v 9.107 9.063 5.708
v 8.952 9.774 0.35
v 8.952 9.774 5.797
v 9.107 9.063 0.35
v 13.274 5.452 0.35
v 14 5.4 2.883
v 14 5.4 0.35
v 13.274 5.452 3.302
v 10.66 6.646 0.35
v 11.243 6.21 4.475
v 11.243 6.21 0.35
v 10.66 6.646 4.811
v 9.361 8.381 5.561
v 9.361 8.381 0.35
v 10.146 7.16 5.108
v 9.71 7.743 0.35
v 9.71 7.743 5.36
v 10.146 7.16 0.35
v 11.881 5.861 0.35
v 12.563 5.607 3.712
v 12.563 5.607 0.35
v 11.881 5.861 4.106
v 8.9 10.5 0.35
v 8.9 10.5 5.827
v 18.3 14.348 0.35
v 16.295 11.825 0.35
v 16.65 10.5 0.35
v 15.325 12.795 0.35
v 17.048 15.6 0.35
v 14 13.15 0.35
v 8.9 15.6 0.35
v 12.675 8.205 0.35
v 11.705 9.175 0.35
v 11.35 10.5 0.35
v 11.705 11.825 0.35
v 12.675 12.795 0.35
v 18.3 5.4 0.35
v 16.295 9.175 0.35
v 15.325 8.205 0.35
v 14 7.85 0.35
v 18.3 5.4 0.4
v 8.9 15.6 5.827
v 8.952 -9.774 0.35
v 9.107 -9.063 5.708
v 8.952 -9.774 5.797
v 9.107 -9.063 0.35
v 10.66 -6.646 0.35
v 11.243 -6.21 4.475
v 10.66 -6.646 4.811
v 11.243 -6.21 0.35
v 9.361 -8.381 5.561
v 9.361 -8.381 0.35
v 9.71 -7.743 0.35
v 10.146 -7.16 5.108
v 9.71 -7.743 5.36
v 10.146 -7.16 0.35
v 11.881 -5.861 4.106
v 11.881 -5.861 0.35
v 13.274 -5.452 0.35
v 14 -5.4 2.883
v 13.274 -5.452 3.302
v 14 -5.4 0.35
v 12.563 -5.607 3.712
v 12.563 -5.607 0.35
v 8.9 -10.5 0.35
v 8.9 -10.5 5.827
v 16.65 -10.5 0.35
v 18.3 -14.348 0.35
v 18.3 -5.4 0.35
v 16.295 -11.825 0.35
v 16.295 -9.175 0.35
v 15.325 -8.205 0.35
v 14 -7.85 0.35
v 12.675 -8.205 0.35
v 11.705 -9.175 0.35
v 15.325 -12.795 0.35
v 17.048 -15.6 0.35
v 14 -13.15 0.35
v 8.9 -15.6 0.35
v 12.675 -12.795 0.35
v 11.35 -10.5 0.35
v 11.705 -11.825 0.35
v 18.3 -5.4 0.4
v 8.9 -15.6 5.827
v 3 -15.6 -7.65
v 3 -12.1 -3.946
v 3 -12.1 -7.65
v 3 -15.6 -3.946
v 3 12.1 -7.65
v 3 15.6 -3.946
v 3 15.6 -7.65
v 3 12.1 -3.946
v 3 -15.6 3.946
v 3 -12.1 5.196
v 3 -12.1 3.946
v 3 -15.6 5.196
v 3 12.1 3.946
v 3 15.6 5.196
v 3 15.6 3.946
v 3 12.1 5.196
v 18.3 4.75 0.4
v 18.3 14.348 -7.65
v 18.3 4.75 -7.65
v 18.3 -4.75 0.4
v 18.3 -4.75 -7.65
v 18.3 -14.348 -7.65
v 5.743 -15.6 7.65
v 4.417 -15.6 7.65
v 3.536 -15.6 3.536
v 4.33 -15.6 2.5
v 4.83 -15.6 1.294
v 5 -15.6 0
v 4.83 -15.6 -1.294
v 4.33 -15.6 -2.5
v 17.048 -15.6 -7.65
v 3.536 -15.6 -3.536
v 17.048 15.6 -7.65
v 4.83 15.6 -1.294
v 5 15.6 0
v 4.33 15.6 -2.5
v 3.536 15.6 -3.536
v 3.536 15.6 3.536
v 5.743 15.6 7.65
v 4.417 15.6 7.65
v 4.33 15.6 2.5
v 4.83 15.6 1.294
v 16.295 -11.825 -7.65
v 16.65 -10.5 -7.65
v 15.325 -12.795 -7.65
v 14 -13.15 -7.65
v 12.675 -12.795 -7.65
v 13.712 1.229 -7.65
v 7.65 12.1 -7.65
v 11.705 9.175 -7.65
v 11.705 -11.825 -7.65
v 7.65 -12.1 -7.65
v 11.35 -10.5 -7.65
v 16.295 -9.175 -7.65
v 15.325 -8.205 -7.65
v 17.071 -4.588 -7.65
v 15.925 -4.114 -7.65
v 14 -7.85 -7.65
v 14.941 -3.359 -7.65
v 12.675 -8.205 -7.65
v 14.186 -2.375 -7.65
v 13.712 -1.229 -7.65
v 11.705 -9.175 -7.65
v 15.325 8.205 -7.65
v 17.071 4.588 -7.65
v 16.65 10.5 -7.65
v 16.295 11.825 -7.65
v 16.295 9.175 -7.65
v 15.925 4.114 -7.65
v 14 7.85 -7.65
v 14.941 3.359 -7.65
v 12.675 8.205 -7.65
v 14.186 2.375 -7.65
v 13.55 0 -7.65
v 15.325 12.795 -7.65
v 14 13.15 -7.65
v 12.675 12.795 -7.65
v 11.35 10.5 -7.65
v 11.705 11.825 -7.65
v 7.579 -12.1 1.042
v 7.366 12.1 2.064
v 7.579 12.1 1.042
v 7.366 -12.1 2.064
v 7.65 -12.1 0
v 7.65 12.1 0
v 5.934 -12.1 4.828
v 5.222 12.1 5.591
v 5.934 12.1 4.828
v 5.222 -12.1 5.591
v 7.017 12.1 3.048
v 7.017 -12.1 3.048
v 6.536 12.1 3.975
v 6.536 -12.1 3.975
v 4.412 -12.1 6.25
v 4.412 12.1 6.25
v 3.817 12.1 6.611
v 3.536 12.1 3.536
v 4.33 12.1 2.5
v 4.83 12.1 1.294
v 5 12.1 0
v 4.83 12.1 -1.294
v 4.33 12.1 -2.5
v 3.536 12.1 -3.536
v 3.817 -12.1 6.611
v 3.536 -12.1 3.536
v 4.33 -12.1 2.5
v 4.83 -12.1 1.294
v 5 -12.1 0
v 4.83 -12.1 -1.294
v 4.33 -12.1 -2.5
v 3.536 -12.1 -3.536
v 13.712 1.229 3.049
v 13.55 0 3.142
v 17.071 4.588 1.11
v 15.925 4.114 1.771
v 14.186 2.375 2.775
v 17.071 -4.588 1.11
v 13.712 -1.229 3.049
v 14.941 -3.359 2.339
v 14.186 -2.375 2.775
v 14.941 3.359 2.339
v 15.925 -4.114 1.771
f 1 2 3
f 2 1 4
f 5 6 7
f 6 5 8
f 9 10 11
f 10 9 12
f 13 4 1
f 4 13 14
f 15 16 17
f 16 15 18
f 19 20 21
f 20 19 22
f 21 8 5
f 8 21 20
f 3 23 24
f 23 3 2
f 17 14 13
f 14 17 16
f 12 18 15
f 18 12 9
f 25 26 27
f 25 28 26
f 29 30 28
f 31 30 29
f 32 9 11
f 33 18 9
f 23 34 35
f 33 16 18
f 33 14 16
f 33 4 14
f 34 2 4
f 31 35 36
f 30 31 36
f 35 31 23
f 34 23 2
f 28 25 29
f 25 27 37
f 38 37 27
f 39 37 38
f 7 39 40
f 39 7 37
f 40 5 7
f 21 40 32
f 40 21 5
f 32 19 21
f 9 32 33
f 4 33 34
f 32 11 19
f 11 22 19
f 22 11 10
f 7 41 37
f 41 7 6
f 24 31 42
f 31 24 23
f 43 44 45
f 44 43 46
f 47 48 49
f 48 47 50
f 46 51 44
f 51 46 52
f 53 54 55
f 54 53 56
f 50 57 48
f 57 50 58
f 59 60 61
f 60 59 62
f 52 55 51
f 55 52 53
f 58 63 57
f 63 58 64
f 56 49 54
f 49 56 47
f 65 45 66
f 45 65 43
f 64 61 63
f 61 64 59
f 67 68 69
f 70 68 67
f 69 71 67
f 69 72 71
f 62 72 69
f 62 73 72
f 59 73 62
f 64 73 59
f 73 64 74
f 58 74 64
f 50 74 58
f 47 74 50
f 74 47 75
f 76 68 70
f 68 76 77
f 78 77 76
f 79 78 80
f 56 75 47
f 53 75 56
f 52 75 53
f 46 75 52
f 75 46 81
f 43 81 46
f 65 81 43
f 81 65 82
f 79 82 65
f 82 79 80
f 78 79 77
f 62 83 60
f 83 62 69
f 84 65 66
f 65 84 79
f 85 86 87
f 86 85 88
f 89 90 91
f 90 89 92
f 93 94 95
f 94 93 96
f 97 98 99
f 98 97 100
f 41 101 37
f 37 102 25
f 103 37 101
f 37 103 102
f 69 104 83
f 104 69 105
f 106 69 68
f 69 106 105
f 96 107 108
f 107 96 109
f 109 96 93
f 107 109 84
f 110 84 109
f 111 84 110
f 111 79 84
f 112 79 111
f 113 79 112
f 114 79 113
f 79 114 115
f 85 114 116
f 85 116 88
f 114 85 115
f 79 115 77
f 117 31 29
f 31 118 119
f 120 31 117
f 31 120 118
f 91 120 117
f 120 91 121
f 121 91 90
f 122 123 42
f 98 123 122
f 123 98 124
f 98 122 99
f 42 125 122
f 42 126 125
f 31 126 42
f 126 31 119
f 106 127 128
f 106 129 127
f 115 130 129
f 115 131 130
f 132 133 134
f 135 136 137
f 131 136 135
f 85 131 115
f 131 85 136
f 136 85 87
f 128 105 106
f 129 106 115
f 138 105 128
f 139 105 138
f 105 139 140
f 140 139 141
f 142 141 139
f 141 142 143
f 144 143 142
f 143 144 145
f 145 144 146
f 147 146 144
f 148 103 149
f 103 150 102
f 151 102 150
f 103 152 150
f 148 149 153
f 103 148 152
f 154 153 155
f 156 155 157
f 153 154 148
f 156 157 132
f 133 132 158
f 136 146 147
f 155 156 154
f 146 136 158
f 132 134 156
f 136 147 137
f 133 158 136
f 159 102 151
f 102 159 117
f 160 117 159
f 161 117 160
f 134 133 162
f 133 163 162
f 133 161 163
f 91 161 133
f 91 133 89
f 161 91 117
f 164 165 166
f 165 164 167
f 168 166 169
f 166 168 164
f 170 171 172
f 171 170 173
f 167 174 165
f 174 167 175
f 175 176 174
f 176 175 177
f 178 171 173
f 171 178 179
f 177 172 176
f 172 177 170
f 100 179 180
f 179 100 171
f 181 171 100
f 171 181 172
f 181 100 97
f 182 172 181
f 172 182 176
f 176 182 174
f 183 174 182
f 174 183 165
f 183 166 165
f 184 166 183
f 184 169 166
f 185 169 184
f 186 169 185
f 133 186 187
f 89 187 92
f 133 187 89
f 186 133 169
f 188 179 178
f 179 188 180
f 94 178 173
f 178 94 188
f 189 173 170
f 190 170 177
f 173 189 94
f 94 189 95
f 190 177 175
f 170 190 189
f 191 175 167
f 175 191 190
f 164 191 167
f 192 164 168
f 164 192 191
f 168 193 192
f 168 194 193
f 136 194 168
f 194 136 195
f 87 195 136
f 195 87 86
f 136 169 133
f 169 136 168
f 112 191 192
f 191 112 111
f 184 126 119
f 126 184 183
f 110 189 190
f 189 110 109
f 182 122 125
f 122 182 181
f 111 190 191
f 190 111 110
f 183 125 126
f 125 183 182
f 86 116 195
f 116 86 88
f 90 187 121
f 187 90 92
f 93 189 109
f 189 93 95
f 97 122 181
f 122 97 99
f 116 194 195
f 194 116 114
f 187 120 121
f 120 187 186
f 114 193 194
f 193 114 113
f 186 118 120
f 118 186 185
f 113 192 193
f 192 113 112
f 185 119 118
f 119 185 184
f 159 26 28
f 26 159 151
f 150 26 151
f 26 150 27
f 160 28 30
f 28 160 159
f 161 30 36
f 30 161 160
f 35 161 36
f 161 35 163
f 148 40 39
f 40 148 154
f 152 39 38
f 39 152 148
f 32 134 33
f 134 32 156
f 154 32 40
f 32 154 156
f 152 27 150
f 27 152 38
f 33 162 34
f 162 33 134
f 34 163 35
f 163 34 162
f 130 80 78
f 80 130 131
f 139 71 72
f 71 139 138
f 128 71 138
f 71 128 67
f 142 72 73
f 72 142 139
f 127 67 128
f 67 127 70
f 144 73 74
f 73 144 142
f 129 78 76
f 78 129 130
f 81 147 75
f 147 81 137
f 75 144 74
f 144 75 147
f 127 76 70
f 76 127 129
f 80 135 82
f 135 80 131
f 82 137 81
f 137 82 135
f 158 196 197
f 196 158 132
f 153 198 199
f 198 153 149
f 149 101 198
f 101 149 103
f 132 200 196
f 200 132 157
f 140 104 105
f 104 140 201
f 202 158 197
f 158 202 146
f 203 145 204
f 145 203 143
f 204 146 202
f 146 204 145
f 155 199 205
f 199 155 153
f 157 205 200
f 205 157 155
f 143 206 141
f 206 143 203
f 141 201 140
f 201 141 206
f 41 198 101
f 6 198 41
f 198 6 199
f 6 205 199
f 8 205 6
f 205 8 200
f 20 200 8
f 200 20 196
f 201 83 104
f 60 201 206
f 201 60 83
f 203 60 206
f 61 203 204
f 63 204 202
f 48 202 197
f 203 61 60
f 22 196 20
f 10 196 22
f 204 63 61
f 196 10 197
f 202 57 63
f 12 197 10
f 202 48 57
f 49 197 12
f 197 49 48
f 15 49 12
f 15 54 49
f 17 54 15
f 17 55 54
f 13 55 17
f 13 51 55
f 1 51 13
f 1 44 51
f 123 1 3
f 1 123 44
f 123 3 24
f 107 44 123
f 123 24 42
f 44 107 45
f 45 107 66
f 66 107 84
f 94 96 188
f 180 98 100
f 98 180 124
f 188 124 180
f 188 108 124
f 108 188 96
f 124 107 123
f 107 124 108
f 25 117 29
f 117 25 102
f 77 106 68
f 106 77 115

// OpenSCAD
//////////////////////////////////////////////////////////////////////////////////////////////
// Zero height LM8UU bearing holder
//
// Copyright (C) 2013  Lochner, Juergen
// http://www.thingiverse.com/Ablapo/designs
//
// This program is free software; you can redistribute it and/or
// modify it under the terms of the GNU General Public License
// as published by the Free Software Foundation; either version 2
// of the License, or (at your option) any later version.
//
// This program is distributed in the hope that it will be useful,
// but WITHOUT ANY WARRANTY; without even the implied warranty of
// MERCHANTABILITY or FITNESS FOR A PARTICULAR PURPOSE.  See the
// GNU General Public License for more details.
//
// You should have received a copy of the GNU General Public License
// along with this program; if not, write to the Free Software
// Foundation, Inc., 51 Franklin Street, Fifth Floor, Boston, MA  02110-1301, USA.
/////////////////////////////////////////////////////////////////////////////////////////////////

// bearing's length
b_length=24.2 ;		
// bearing's diameter
b_dia= 15.3;		

// x distance of holes
dx=28;			
// y distance of holes	
dy=21;				

angle=60;			// holder cut off angle
b_angle=30;		// bearing cut off angle

bolt=4.9+0.4;		// M5 bolt diameter
nut=9.8+0.4; 		// washer's size 

rod=8+2;			// round cut at center rod
zcutoff=0;		// 0= cut height at bearing's height

boltlength=20-6-4-1-1;   // 20 mm bolt, 6 mm aluplate, 4mm nut, 1mm washer

module holder(){
intersection(){
	difference(){

		translate([b_dia/2+3,0,0.5]) rotate([90,0,0])cube ([b_dia,b_dia+1,b_length+8-1],center=true);
		#rotate([90,0,0]) cylinder(h=b_length,r=b_dia/2,center=true,$fn=46);								// cut bearing
		translate([0 ,0,-b_dia/2]) rotate([90,0,0])cube ([b_dia,b_dia,b_length],center=true);			// cut below bearing

		#rotate([90,0,0]) cylinder(h=b_length+15,r=rod/2,center=true,$fn=24);								// cut center rod
 
		#translate([dx/2,dy/2,0])cylinder(h=b_dia*3,r=bolt/2, center=true,$fn=12);						// cut bolt 1
		translate([dx/2,dy/2,0.5+boltlength])
			union(){
				cylinder(h=b_dia+1,r=nut/2, center=true,$fn=44);
				translate([nut/2,0,0])cube ([nut,nut,b_dia+1],center=true);
				translate([0,nut/2,0])cube ([nut,nut,b_dia+1],center=true);
			}
	
		#translate([dx/2,-dy/2,0])cylinder(h=b_dia*3,r=bolt/2, center=true,$fn=12);						// cut bolt 2
		translate([dx/2,-dy/2,0.5+boltlength])
			union(){
				cylinder(h=b_dia+1,r=nut/2, center=true,$fn=44);
				translate([ nut/2,0,0])cube ([nut,nut,b_dia+1],center=true);
				translate([0,-nut/2,0])cube ([nut,nut,b_dia+1],center=true);
			}

		translate([b_dia+3,0,0]) cylinder(h=b_length+15,r=9.5/2,center=true,$fn=24);						// slim cut

		translate([b_dia+3,0,0.4])rotate([0,-angle,0])translate([b_dia*1.5,0,b_dia*1.5])cube([b_dia*3,b_length+8+1,b_dia*3],center=true); // cut holder angle
		rotate([0,b_angle,0])translate([-b_dia*1.5,0,b_dia*1.5])cube([b_dia*3,b_length+8+1,b_dia*3],center=true);		// cut bearing angle
		translate([0,0,b_dia*1.5-b_dia/2+b_dia+zcutoff])cube([b_dia*3,b_length+8+1,b_dia*3],center=true);		// cut top

	}

	cylinder(h=b_dia*4,r=b_length-0.3,center=true,$fn=12);
}
}

module spacer(){
	difference(){
		cylinder(h=6,r=10/2-0.1,center=true,$fn=44);
		cylinder(h=7,r=8/2,center=true,$fn=44);
	}
}

module plate(){
	translate([-2,0,0])holder();
	translate([2,0,0])rotate([0,0,180]) holder();
}

//plate();
holder();
